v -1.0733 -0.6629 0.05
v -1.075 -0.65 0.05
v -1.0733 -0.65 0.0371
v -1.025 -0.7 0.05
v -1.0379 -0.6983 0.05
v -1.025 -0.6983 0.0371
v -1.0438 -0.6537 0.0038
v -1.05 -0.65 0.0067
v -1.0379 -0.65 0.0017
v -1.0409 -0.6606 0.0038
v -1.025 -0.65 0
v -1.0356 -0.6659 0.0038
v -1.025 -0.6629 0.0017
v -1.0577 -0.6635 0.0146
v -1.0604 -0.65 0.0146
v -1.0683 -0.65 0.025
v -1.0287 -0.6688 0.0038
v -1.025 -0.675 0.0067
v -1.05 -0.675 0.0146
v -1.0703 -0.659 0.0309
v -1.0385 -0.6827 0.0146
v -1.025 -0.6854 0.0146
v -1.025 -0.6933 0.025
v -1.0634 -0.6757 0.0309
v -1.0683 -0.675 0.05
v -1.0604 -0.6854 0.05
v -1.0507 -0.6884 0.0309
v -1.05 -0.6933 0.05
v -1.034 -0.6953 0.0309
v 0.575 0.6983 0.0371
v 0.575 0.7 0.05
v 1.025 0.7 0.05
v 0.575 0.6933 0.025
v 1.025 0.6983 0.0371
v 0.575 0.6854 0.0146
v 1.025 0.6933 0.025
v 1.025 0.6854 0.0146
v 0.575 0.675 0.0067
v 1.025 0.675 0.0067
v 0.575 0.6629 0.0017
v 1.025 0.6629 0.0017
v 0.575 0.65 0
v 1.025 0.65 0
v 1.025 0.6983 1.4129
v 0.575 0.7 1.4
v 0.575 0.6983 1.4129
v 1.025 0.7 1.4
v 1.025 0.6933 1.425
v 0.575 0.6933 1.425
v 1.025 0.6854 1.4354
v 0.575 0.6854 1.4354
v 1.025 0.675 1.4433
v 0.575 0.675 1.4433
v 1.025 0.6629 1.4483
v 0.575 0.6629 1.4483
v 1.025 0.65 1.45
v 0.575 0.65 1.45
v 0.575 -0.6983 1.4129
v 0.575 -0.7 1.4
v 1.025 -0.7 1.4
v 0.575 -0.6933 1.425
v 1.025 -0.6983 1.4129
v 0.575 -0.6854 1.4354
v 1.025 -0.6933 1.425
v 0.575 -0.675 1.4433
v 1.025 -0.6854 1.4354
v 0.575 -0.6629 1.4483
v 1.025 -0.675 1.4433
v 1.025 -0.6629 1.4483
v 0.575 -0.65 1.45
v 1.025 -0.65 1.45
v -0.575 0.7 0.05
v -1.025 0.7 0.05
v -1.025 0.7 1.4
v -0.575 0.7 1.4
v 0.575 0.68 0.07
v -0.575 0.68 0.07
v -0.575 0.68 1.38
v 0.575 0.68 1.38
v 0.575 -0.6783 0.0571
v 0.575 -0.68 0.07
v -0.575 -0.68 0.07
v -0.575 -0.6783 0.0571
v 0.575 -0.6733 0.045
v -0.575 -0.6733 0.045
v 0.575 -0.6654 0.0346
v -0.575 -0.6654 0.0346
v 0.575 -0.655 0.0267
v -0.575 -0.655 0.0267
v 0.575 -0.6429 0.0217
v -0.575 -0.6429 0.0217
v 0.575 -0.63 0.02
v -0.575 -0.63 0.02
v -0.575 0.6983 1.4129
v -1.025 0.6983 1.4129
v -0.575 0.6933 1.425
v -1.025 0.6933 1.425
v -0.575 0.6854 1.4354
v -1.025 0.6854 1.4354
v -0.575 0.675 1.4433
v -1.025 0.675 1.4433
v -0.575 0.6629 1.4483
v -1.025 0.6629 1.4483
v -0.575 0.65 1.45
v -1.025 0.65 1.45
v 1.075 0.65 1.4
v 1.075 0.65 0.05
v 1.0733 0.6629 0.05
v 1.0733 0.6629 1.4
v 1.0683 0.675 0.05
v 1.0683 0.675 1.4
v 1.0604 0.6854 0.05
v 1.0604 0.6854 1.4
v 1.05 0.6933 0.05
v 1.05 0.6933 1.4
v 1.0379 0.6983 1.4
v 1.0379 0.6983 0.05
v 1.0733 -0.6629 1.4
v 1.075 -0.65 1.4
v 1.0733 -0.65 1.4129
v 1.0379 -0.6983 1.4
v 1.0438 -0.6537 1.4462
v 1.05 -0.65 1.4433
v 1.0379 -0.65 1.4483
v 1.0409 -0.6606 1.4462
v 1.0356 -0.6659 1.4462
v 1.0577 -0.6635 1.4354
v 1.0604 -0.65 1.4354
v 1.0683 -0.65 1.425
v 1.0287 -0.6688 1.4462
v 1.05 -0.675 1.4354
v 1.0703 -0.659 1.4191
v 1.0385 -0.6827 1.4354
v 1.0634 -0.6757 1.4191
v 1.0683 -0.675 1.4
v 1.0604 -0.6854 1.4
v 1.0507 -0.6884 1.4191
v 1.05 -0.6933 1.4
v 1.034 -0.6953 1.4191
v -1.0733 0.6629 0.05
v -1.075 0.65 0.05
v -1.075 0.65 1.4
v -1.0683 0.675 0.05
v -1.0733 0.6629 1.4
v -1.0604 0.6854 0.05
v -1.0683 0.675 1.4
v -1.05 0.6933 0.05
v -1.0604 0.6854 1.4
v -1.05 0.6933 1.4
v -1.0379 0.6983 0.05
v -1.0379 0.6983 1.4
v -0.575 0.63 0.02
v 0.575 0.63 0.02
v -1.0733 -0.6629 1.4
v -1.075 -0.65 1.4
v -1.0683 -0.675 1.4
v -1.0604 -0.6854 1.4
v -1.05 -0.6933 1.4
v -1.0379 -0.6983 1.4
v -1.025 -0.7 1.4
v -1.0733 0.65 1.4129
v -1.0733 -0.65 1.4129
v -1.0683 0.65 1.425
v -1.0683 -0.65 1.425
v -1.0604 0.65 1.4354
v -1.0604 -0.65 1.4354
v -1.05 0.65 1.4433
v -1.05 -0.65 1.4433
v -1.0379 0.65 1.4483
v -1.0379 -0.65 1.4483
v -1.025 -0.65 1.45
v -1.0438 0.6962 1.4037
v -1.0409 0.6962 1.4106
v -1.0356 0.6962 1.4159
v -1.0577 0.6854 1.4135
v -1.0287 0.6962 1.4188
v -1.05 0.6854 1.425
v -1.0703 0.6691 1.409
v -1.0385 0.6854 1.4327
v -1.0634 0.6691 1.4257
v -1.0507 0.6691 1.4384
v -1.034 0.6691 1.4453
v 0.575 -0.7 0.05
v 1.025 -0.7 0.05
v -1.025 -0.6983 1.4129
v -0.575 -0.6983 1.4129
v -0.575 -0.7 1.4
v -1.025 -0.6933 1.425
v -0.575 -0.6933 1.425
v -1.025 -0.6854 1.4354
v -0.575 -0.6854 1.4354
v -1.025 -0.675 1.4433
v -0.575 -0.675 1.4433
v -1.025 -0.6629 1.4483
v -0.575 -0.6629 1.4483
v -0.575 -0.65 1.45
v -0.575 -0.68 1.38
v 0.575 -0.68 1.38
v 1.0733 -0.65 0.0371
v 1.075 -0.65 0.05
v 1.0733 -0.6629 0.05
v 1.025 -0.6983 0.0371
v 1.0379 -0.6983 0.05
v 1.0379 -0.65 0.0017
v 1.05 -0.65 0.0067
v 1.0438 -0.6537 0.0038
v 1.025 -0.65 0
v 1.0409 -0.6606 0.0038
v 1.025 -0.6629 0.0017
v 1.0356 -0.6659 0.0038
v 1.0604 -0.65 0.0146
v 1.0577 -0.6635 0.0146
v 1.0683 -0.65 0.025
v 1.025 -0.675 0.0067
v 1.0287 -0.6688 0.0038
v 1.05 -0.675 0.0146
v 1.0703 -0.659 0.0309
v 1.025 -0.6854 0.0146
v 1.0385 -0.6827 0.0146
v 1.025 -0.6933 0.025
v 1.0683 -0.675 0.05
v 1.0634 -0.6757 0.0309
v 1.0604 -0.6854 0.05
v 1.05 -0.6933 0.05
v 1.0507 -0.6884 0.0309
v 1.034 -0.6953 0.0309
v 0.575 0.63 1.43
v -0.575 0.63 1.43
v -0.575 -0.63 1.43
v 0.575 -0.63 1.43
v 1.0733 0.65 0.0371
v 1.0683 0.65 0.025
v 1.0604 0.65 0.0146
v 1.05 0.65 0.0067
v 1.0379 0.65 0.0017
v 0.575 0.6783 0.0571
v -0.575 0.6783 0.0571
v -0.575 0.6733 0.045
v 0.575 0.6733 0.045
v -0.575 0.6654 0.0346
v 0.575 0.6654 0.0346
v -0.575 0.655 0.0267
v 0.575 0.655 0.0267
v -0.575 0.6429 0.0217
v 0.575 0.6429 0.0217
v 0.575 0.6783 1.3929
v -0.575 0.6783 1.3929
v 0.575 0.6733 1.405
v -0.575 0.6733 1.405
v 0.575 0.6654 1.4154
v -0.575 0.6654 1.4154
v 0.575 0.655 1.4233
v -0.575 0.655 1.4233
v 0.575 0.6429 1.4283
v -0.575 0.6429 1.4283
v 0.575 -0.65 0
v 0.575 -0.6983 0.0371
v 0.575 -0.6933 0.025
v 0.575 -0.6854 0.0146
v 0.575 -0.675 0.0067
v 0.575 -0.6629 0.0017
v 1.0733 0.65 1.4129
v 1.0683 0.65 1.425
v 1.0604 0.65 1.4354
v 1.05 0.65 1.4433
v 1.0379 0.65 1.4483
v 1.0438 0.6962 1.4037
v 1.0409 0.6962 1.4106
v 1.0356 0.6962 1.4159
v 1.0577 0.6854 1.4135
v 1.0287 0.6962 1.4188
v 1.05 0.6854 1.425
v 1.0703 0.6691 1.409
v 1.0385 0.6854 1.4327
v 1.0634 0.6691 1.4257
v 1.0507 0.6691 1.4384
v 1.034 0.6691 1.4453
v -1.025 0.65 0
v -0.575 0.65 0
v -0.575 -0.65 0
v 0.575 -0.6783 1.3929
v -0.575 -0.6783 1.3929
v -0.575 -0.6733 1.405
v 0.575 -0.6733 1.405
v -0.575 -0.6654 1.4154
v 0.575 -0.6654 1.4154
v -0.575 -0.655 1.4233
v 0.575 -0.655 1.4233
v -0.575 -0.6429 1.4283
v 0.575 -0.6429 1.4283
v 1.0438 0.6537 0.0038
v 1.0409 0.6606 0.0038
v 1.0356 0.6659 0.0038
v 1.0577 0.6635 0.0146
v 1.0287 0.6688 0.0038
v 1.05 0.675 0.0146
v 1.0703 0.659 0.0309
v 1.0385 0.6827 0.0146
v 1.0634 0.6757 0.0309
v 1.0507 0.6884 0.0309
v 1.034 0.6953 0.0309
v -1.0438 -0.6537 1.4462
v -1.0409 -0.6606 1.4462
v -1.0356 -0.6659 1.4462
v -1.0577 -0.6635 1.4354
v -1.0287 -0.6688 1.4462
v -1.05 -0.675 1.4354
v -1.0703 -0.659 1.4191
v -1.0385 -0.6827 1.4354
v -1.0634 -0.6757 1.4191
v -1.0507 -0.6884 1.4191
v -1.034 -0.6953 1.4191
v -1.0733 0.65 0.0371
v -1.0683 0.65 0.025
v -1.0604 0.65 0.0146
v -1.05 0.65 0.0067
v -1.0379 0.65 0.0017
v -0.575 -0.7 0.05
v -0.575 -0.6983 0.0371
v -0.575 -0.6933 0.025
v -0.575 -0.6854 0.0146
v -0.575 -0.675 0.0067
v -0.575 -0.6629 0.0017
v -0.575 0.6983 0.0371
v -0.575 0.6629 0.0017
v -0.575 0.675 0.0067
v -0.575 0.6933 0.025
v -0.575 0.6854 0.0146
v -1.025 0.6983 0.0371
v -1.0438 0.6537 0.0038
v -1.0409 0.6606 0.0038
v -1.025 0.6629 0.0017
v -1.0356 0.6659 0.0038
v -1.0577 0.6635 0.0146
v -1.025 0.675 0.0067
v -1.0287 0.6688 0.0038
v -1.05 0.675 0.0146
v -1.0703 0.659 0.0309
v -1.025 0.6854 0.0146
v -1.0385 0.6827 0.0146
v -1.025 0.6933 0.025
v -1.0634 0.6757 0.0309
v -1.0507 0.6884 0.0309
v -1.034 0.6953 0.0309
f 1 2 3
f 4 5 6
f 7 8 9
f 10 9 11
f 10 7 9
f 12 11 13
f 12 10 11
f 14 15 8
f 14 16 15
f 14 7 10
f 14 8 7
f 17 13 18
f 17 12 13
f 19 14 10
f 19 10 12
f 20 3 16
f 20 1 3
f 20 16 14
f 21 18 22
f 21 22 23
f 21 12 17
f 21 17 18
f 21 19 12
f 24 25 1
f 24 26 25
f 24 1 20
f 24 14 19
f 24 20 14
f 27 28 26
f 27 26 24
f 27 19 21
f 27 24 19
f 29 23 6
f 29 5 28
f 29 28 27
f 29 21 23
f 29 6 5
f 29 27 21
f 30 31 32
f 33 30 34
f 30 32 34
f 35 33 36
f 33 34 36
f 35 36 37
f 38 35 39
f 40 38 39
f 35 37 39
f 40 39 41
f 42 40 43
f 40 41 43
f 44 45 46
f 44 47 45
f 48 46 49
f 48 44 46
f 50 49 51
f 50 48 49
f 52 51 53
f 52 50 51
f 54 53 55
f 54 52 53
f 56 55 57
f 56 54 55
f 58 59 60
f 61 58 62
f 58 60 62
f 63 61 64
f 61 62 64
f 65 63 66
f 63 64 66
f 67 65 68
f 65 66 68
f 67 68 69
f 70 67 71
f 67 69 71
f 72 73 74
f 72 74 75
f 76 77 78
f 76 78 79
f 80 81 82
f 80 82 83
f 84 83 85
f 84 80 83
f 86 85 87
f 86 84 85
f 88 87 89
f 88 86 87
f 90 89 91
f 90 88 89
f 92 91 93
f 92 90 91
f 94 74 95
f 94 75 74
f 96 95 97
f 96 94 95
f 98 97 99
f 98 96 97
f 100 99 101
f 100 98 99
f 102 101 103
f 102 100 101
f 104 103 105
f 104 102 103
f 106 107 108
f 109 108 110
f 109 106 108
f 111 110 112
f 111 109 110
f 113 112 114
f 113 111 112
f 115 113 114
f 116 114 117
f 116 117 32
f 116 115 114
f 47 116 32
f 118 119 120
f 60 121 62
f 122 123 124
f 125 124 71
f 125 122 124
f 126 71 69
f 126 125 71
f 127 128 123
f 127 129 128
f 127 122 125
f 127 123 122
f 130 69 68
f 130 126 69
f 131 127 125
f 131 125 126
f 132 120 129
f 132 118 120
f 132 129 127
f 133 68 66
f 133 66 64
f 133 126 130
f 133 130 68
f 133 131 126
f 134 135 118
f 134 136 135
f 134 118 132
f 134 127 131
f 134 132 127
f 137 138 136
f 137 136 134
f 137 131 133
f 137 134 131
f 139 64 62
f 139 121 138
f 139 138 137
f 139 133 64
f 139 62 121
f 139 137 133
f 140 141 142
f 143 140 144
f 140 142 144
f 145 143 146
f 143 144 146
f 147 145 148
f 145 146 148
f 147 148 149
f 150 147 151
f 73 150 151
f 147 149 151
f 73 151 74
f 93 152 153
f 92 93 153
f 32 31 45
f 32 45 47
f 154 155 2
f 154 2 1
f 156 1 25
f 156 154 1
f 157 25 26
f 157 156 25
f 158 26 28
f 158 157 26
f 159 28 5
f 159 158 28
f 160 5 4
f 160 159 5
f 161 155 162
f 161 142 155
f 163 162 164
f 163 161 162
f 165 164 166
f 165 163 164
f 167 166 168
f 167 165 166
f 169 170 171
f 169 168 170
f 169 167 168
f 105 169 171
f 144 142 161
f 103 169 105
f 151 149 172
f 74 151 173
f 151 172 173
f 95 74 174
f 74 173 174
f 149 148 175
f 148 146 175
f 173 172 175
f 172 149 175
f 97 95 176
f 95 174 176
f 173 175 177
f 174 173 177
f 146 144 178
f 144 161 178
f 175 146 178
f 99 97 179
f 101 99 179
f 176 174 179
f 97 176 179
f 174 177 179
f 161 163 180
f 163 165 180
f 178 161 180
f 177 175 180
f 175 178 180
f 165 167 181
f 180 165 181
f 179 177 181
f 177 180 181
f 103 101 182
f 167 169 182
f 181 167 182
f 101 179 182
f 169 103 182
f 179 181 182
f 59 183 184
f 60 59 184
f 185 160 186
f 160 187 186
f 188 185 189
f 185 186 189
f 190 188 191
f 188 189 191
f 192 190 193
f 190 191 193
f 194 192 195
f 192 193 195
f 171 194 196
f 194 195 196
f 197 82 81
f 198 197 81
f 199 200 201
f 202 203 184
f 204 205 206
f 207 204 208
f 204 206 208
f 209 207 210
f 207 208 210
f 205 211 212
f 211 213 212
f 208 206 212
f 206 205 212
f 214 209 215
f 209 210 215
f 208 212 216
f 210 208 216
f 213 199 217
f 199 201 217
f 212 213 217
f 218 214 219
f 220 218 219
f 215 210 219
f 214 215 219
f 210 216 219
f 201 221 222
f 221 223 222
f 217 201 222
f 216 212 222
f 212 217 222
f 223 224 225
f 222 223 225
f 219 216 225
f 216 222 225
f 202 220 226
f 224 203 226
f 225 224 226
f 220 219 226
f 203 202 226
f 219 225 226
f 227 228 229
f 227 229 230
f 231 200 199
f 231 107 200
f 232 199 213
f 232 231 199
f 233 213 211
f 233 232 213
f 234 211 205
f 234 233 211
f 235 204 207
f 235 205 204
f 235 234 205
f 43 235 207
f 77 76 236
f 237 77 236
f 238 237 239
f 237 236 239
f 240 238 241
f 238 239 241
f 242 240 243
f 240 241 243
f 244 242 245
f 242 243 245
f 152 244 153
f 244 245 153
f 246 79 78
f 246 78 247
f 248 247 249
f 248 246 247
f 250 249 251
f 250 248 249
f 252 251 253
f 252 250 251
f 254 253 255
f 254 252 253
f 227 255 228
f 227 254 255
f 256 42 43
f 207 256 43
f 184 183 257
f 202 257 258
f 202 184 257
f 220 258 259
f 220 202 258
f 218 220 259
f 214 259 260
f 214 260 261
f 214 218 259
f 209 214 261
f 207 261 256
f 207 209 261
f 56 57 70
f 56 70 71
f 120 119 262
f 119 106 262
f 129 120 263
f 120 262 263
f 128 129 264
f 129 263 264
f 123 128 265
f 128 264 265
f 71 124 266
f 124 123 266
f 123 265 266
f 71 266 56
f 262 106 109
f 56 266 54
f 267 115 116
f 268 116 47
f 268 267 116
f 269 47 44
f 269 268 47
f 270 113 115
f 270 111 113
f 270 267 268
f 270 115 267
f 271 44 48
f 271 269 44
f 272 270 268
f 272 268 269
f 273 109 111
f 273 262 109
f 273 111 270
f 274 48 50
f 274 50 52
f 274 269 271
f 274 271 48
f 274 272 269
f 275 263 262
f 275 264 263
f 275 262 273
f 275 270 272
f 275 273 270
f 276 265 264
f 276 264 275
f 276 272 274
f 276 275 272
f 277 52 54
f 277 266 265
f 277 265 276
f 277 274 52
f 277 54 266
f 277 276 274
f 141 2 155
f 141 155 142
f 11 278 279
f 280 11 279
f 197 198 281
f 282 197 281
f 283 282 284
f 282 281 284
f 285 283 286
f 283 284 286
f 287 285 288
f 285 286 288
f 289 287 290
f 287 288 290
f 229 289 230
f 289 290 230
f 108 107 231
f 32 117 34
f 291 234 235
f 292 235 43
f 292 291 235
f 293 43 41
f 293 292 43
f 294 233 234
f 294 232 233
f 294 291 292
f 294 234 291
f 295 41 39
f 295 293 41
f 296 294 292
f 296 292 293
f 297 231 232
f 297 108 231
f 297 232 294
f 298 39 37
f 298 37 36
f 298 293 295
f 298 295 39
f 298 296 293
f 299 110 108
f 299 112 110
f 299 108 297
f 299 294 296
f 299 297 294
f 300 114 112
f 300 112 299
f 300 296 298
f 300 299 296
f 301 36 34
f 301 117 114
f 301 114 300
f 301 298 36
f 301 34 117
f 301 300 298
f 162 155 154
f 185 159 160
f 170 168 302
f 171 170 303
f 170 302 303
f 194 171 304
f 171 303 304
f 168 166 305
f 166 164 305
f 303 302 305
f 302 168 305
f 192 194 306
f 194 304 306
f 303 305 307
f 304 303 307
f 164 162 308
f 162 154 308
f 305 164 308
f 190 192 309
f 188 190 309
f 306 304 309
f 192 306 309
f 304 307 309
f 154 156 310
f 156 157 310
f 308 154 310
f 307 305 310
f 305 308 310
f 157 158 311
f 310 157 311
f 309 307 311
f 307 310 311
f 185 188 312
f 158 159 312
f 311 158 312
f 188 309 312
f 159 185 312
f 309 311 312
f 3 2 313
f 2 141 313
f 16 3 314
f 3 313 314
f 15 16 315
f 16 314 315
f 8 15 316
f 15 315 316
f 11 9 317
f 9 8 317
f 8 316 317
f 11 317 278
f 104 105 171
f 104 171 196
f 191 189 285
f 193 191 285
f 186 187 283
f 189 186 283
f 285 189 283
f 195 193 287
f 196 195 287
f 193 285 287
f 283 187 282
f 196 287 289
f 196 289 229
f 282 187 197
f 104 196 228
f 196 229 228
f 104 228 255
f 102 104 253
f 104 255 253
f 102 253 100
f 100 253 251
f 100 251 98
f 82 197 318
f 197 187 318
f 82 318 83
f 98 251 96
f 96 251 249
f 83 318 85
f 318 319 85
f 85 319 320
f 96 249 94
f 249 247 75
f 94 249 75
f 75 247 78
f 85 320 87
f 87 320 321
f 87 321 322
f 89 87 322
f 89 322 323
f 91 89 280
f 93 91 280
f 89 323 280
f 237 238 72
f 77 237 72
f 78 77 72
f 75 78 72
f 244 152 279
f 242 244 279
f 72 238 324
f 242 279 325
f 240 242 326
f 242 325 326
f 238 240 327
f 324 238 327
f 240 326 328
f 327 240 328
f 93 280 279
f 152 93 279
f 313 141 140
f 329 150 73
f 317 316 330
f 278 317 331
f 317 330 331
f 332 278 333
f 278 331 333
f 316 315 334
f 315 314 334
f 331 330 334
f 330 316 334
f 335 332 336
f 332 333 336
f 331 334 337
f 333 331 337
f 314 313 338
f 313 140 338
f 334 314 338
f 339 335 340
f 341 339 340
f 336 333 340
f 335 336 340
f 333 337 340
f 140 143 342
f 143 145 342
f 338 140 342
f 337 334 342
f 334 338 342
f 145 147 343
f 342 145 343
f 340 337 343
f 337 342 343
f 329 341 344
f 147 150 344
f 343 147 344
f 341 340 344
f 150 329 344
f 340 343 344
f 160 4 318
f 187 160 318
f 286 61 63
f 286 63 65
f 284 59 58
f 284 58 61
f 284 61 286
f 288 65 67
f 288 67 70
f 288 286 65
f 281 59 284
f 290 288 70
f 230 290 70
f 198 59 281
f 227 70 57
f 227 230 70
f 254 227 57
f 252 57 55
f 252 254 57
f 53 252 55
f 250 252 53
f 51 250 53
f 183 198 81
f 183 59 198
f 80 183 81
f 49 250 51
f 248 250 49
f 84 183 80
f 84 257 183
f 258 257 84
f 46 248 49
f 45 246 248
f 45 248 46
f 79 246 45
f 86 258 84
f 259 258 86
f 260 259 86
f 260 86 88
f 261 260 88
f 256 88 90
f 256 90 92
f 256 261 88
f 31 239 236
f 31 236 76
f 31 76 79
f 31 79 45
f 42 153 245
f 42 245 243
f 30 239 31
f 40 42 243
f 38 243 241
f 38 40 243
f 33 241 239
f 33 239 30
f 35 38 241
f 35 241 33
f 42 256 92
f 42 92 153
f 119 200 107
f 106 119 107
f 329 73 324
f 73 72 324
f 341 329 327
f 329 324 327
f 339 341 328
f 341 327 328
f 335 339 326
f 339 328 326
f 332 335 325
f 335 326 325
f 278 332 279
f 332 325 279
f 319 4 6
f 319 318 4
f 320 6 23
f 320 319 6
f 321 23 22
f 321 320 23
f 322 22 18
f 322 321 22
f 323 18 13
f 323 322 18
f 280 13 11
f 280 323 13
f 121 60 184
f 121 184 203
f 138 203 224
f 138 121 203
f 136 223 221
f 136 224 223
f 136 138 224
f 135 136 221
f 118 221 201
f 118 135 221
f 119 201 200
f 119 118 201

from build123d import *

# Parameters (mm, degrees)
PLATING_LEFT_W      = 0.5
PLATING_LEFT_H      = 1.4
PLATING_LEFT_DEPTH  = 1.45
PLATING_LEFT_F_R    = 0.05
PLATING_RIGHT_W     = 0.5
PLATING_RIGHT_H     = 1.4
PLATING_RIGHT_DEPTH = 1.45
PLATING_RIGHT_F_R   = 0.05
CHIP_W              = 2.11
CHIP_H              = 1.36
CHIP_DEPTH          = 1.41
CHIP_F_R            = 0.05


with BuildPart() as plating_left_f:
    # plating_left → plating_left (new body)
    with BuildSketch(Plane(origin=(-1.075, -0.7, 0), x_dir=(1, 0, 0), z_dir=(0, 0, 1))):
        with Locations((0.25, 0.7)):
            Rectangle(PLATING_LEFT_W, PLATING_LEFT_H)
    extrude(amount=PLATING_LEFT_DEPTH)

    # plating_left_f
    plating_left_f_edges = [plating_left_f.edges().sort_by_distance(p)[0] for p in [
        (-1.075, -0.7, 0.725),
        (-1.075, 0, 1.45),
        (-1.075, 0.7, 0.725),
        (-1.075, 0, 0),
        (-0.825, -0.7, 0),
        (-0.825, -0.7, 1.45),
        (-0.825, 0.7, 0),
        (-0.825, 0.7, 1.45),
    ]]
    fillet(plating_left_f_edges, radius=PLATING_LEFT_F_R)


with BuildPart() as plating_right_f:
    # plating_right → plating_right (new body)
    with BuildSketch(Plane(origin=(0.575, -0.7, 0), x_dir=(1, 0, 0), z_dir=(0, 0, 1))):
        with Locations((0.25, 0.7)):
            Rectangle(PLATING_RIGHT_W, PLATING_RIGHT_H)
    extrude(amount=PLATING_RIGHT_DEPTH)

    # plating_right_f
    plating_right_f_edges = [plating_right_f.edges().sort_by_distance(p)[0] for p in [
        (1.075, -0.7, 0.725),
        (1.075, 0, 1.45),
        (1.075, 0.7, 0.725),
        (1.075, 0, 0),
        (0.825, -0.7, 0),
        (0.825, -0.7, 1.45),
        (0.825, 0.7, 0),
        (0.825, 0.7, 1.45),
    ]]
    fillet(plating_right_f_edges, radius=PLATING_RIGHT_F_R)


with BuildPart() as capacitor:
    # chip → chip (new body)
    with BuildSketch(Plane(origin=(-1.055, -0.68, 0.02), x_dir=(1, 0, 0), z_dir=(0, 0, 1))):
        with Locations((1.055, 0.68)):
            Rectangle(CHIP_W, CHIP_H)
    extrude(amount=CHIP_DEPTH)

    # chip_f
    chip_f_edges = [capacitor.edges().sort_by_distance(p)[0] for p in [
        (0, -0.68, 0.02),
        (0, -0.68, 1.43),
        (0, 0.68, 0.02),
        (0, 0.68, 1.43),
    ]]
    fillet(chip_f_edges, radius=CHIP_F_R)

    # capacitor: union plating_left_f, plating_right_f
    add(plating_left_f.part)
    add(plating_right_f.part)


solid = capacitor.part
